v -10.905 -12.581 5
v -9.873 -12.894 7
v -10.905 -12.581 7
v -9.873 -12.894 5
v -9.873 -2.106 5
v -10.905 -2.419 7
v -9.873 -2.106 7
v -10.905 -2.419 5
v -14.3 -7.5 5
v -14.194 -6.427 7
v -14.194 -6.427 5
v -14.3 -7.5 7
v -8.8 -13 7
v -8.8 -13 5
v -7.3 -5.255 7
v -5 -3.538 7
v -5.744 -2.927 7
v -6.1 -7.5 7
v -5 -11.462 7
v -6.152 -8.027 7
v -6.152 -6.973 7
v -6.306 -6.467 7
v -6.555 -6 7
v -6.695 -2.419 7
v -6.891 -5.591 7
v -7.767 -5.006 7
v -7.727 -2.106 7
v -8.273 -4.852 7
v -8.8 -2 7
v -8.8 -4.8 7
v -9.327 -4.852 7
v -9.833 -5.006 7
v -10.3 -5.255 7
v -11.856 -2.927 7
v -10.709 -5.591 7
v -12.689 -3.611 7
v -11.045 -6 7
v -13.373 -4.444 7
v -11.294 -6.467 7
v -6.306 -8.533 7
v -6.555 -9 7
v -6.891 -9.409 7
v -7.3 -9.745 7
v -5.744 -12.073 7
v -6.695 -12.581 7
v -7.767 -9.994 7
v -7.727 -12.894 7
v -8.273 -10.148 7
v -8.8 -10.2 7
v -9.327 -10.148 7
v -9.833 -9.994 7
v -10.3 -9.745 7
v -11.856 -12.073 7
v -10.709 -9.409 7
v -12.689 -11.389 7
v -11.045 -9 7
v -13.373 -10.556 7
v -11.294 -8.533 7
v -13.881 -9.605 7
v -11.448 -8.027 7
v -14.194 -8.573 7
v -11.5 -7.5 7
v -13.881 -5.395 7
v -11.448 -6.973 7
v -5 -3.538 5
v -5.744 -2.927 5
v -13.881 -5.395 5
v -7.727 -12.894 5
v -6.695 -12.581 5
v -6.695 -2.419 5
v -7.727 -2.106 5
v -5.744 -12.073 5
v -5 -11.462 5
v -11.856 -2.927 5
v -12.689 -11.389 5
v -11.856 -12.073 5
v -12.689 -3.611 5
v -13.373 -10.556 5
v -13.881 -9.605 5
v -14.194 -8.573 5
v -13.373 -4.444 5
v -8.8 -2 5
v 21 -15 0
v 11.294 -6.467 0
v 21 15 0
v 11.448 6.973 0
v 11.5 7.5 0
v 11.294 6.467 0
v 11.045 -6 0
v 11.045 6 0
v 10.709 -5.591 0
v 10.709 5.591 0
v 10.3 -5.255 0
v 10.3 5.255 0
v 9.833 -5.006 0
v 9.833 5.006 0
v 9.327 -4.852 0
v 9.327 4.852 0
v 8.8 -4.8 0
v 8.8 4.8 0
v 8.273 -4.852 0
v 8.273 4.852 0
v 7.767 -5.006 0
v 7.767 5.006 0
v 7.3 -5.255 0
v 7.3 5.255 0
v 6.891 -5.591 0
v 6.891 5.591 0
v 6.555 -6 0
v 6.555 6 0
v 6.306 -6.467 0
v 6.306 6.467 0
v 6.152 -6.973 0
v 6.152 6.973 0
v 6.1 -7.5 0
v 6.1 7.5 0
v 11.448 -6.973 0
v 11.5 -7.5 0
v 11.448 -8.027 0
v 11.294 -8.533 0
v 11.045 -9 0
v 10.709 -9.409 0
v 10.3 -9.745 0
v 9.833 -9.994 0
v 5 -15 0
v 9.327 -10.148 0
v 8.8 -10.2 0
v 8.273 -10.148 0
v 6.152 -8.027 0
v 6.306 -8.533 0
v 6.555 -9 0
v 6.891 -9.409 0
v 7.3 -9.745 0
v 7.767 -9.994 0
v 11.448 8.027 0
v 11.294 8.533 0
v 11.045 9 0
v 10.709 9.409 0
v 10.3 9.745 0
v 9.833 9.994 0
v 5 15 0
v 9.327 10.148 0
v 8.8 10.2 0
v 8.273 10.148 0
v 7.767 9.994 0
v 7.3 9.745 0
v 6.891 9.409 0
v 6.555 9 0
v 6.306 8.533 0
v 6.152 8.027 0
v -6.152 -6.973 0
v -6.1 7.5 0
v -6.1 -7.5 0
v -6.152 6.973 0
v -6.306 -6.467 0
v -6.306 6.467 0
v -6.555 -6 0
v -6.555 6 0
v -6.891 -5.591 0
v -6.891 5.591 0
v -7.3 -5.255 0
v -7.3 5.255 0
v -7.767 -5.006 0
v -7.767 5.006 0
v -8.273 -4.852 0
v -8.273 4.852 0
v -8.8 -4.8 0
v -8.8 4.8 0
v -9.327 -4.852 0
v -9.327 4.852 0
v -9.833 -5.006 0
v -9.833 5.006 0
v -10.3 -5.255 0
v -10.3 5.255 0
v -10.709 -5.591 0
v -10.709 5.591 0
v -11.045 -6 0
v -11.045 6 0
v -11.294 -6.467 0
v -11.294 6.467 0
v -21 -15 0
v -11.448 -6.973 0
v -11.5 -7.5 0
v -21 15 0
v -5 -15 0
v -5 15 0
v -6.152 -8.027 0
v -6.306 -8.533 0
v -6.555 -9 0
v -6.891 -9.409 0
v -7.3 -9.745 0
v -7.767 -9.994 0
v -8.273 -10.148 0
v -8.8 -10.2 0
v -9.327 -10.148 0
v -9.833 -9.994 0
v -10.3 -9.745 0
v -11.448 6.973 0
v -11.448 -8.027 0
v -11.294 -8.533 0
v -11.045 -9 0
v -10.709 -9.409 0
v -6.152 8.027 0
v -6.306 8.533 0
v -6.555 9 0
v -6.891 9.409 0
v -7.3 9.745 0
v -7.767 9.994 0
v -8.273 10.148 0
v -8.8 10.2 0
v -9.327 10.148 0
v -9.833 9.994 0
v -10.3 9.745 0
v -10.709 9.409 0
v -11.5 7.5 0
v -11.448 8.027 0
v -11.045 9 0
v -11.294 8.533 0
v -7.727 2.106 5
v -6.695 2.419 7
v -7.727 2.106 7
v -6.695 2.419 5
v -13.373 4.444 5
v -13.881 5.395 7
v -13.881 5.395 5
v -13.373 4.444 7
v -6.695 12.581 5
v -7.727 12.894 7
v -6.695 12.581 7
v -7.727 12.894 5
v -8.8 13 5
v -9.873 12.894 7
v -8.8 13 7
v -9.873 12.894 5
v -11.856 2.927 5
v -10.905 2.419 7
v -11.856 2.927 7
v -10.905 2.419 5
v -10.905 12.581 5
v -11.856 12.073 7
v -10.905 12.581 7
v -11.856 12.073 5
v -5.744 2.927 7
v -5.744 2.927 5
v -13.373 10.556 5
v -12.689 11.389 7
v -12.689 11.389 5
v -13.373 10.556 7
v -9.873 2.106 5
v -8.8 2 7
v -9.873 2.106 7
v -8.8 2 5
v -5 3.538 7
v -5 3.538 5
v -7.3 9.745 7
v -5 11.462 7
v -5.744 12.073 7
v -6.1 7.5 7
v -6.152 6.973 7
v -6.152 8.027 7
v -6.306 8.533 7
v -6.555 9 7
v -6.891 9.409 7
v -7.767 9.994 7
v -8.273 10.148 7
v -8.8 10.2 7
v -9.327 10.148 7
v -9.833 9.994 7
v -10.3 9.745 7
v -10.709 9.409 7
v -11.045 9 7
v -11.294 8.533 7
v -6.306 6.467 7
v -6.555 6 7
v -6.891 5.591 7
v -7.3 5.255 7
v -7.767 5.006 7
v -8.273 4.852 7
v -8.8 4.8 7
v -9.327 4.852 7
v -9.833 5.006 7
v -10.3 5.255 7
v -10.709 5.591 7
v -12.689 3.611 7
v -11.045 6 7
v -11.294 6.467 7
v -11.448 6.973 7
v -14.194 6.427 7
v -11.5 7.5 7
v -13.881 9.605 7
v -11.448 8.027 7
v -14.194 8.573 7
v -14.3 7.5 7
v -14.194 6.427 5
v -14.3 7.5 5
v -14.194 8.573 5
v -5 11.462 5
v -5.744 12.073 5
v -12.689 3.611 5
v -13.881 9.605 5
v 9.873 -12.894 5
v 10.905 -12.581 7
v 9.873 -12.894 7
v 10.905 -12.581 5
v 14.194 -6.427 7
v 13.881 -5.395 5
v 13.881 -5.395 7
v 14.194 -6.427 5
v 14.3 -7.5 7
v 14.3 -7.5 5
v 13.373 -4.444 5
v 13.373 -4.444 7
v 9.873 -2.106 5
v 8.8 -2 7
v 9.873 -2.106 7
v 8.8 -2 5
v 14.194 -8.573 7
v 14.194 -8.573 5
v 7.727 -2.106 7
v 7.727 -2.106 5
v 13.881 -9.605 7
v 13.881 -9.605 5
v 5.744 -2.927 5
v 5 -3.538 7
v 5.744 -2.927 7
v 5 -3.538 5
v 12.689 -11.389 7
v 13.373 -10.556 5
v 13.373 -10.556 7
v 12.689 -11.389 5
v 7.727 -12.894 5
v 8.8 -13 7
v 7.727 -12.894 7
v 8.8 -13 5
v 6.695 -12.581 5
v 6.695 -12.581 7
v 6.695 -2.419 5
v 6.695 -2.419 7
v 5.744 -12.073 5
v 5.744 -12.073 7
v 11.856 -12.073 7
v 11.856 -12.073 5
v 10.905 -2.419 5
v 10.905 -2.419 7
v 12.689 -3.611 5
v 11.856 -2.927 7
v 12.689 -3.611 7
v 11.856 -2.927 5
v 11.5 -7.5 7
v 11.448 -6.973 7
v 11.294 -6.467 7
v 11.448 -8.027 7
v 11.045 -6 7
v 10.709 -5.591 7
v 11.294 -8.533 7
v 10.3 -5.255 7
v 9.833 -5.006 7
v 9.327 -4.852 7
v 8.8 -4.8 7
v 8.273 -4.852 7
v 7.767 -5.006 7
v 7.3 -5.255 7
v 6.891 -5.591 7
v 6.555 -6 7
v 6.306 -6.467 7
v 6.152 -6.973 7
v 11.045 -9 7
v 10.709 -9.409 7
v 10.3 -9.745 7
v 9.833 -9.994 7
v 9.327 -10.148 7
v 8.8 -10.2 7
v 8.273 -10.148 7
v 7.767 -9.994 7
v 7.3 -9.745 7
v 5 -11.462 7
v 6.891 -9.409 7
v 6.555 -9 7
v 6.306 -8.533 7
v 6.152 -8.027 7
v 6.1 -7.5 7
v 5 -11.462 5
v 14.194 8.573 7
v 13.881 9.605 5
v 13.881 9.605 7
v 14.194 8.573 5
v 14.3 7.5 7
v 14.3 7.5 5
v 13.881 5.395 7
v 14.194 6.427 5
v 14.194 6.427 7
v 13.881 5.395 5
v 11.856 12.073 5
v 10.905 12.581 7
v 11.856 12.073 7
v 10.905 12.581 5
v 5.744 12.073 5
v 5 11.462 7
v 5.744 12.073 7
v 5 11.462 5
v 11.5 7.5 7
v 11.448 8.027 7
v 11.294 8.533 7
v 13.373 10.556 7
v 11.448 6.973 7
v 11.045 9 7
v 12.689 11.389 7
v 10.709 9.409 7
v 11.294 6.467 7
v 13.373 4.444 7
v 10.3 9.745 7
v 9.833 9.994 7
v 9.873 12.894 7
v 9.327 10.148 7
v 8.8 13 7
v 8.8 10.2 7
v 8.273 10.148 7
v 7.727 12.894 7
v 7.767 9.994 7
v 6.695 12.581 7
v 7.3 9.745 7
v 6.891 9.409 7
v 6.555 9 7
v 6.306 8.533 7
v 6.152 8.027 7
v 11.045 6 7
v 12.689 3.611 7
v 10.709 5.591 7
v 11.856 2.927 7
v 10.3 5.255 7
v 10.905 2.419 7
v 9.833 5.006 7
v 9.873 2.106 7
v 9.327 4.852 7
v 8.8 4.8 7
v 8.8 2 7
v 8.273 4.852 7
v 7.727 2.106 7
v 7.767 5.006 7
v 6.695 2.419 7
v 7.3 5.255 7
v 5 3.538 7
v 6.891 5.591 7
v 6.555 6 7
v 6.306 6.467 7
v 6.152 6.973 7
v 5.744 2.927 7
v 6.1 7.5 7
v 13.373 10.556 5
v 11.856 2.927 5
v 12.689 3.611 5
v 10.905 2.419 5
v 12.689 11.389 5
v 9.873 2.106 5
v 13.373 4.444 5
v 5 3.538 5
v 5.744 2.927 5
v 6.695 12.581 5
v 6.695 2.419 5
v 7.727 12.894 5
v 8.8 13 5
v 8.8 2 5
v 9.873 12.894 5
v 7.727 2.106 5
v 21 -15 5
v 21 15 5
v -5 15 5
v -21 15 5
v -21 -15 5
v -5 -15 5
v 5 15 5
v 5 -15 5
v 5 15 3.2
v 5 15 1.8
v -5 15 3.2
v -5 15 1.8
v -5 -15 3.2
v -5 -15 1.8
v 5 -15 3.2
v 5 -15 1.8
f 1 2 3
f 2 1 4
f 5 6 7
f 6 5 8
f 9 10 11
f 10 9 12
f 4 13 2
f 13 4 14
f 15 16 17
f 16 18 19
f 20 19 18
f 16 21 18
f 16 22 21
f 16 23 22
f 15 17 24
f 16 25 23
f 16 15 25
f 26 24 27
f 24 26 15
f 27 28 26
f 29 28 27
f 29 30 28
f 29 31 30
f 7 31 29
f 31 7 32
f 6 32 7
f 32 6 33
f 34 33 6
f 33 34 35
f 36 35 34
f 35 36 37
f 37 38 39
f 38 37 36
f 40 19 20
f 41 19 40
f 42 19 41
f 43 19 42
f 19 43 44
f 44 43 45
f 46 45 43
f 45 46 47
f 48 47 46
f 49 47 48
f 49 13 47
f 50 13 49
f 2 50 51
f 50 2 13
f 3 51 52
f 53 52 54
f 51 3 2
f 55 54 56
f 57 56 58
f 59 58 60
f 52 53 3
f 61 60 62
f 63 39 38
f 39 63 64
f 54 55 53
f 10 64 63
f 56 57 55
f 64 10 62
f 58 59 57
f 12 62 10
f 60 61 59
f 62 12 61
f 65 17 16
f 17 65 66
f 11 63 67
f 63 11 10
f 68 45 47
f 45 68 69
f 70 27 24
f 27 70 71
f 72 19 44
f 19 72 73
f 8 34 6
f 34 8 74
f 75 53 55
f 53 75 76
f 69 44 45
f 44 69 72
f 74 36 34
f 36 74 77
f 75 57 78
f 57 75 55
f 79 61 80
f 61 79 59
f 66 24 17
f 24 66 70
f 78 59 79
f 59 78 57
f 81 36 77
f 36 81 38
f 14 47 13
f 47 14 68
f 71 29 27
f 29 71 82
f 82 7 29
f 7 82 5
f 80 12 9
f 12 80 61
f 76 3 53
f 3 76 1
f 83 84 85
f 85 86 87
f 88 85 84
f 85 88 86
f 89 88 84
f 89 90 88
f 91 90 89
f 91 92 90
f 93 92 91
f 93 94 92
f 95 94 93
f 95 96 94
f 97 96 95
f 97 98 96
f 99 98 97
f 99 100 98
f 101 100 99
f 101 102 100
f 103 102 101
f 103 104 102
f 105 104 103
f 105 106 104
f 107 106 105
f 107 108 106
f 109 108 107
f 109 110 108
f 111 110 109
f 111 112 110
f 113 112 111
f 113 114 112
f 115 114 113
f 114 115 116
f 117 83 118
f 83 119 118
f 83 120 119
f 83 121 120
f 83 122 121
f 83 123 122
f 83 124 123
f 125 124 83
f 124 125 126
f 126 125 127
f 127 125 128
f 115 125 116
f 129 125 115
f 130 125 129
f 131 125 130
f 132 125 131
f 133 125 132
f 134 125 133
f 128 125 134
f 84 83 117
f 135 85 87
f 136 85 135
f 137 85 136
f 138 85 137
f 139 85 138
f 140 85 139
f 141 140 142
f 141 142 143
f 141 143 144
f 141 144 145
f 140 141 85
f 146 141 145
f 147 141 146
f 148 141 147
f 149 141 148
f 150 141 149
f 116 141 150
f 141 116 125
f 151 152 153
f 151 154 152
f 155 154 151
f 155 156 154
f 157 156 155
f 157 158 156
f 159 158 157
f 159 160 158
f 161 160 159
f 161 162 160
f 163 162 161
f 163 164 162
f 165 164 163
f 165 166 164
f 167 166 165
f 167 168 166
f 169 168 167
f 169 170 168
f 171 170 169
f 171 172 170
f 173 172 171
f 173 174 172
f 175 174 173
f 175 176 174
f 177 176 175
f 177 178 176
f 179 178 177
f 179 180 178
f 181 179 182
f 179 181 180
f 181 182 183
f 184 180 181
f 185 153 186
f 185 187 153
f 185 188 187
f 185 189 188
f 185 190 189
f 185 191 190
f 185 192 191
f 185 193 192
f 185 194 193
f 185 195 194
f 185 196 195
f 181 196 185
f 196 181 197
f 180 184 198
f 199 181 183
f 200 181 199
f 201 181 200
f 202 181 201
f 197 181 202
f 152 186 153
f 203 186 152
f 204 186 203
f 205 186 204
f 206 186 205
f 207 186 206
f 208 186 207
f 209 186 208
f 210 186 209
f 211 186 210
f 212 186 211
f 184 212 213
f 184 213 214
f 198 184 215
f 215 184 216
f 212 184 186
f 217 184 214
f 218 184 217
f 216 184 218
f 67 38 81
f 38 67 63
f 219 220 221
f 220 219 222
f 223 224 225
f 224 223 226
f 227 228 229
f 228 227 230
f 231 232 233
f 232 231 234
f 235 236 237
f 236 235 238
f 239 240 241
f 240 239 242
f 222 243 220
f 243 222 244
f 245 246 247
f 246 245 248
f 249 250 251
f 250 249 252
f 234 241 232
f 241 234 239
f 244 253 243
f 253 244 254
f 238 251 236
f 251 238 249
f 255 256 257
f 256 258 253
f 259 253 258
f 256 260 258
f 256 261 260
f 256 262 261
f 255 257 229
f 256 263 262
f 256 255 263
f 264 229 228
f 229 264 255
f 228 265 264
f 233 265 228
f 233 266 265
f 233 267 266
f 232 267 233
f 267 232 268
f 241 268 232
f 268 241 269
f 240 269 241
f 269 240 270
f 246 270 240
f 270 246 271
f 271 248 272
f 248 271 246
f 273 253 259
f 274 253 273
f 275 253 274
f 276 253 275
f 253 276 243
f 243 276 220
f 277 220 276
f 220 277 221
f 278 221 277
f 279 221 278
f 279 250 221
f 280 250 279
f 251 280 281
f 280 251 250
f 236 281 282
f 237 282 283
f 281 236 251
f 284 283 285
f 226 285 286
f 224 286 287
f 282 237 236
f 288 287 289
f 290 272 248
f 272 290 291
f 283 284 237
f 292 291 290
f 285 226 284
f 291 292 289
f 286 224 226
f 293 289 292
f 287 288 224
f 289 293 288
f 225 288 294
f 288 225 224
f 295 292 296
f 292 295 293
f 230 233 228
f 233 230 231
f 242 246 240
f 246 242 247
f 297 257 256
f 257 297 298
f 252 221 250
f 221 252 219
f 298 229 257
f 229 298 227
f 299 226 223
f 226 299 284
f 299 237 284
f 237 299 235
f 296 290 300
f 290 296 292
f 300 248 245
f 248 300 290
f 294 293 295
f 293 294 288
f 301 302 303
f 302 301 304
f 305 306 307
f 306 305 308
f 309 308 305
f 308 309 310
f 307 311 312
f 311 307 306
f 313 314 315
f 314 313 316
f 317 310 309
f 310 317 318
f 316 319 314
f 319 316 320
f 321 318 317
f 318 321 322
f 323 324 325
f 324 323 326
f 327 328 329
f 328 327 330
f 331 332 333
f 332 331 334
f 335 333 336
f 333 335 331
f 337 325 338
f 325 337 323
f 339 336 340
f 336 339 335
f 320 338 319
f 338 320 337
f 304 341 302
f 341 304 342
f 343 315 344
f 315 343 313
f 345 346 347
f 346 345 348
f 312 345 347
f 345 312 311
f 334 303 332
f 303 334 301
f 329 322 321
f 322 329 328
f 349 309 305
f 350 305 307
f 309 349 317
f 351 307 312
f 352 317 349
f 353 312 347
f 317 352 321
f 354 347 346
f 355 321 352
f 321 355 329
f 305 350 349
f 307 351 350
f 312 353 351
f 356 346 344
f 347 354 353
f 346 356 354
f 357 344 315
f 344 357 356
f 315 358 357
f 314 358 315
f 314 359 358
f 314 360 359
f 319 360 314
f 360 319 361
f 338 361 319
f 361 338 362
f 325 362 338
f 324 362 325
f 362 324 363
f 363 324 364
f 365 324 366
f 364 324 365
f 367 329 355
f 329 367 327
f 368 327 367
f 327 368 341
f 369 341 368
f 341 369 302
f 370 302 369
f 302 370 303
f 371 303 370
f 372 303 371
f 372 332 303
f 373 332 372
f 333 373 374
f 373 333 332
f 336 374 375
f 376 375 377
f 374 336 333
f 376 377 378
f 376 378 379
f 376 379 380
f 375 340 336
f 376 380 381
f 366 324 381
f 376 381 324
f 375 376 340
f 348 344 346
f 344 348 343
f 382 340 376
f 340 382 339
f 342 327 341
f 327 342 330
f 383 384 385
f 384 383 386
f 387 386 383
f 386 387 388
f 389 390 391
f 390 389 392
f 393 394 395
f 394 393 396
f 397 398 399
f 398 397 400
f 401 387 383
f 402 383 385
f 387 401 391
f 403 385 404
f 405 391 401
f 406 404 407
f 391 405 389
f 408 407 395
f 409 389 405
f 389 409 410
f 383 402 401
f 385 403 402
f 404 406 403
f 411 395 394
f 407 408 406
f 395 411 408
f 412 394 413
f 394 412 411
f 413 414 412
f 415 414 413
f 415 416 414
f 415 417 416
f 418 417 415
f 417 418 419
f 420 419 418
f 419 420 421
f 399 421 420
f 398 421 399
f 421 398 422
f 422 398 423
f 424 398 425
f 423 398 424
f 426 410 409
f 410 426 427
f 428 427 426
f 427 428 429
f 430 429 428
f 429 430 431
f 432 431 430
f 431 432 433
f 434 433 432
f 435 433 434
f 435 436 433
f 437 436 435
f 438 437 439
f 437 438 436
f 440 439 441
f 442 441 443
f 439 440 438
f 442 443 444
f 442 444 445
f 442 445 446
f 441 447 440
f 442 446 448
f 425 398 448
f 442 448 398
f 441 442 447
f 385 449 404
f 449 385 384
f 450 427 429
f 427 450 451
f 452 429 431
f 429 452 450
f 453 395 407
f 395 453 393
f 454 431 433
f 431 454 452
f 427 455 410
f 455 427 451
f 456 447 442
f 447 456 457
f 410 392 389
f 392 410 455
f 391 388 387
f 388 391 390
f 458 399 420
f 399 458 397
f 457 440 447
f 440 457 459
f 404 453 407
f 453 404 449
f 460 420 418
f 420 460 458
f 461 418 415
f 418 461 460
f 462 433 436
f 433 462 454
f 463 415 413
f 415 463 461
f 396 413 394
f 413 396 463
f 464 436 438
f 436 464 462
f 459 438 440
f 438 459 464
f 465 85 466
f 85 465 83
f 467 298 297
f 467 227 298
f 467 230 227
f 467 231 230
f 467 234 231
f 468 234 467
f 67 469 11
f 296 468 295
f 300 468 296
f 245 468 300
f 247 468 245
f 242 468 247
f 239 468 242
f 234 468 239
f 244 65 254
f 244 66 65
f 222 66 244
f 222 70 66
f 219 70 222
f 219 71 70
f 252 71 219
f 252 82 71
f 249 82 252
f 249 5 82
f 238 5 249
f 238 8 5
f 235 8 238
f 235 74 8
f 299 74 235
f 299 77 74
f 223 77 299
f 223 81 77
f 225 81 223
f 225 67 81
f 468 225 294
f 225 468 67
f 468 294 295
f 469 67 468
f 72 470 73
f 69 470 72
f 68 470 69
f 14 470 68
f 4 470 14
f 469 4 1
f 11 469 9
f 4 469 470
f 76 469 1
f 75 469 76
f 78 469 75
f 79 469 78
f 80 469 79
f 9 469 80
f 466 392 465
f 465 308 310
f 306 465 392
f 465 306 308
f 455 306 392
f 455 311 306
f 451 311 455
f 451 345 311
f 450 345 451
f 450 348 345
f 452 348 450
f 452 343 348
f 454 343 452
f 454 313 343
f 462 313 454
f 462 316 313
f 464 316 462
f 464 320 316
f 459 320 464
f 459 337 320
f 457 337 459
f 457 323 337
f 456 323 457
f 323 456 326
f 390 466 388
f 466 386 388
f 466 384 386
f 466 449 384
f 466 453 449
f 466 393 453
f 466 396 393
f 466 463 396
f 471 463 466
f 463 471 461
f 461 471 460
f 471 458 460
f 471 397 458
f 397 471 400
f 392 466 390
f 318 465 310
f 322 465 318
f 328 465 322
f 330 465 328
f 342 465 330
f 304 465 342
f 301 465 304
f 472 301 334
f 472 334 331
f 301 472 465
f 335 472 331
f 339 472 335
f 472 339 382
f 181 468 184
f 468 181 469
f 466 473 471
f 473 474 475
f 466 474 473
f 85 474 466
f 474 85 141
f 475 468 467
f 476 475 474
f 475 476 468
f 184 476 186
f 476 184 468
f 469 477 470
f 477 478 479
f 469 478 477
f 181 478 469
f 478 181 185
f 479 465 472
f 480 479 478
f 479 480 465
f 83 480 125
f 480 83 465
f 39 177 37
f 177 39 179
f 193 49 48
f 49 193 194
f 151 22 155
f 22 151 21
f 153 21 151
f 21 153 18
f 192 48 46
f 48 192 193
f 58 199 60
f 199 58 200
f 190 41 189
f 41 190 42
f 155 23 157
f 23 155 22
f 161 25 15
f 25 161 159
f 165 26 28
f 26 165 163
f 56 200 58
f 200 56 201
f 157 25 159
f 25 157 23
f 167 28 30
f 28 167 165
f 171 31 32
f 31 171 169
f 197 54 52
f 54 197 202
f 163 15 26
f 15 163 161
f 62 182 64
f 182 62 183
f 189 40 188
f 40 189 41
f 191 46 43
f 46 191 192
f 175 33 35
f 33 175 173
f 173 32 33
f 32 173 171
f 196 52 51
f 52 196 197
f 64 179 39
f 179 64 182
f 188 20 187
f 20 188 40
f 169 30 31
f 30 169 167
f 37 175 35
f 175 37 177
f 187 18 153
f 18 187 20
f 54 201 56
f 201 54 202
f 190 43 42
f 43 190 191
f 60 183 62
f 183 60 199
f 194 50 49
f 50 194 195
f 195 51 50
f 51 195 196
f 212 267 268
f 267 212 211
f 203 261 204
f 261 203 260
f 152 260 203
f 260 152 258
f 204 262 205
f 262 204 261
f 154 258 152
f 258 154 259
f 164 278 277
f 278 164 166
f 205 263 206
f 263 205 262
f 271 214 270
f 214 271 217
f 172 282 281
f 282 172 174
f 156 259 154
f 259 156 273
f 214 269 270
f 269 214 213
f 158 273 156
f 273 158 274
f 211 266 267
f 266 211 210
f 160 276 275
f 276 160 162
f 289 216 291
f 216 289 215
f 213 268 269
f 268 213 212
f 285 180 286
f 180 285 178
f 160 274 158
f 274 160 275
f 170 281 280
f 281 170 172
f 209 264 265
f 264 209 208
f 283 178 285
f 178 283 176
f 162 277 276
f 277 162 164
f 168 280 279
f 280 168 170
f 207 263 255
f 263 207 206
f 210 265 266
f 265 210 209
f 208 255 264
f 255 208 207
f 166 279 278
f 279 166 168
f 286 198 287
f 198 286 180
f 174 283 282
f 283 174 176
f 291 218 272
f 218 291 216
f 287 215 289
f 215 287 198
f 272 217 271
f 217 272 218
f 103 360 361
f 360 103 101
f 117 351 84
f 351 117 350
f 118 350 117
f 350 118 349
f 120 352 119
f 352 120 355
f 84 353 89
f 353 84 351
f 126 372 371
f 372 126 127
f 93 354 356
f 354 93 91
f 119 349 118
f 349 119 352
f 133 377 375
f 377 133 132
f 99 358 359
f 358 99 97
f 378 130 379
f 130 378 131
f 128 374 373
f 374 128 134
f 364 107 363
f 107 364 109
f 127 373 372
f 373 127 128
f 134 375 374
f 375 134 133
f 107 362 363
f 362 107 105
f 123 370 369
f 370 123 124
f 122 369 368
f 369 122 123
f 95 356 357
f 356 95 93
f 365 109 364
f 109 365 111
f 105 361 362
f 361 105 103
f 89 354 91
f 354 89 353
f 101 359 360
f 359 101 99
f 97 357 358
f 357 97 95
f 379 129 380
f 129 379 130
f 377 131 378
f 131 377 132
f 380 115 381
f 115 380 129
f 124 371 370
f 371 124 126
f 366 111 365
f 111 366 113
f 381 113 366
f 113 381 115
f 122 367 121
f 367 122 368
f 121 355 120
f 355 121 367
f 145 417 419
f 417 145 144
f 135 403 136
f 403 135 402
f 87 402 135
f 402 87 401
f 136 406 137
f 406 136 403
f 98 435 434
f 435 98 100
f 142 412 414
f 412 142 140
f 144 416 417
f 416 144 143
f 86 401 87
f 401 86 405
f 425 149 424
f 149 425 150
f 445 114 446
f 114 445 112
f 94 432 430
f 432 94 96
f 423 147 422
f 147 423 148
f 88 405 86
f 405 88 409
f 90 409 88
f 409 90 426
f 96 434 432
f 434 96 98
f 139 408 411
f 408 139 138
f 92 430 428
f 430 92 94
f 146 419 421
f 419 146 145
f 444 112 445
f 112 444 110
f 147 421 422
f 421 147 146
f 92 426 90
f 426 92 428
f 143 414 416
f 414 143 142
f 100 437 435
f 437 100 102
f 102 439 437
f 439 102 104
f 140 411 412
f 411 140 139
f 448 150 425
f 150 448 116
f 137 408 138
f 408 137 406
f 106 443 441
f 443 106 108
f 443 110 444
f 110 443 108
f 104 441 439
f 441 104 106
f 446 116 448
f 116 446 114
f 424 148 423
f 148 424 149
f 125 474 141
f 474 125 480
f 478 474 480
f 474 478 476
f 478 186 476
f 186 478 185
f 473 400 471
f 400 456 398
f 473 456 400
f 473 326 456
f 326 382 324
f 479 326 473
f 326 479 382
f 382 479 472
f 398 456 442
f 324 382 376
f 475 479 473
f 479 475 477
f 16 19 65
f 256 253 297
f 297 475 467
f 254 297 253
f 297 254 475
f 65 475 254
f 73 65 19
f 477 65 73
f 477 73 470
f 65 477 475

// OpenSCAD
$fn = 32;

// ----------------------------------------------------------------------
// Living hinge: 42 x 30 mm plates, 1.4 mm flexible web
// ----------------------------------------------------------------------

// --- parameters (mm) ---
plate_len = 16;           // plate length outside the web
plate_w = 30;             // plate width
thick = 5;                // plate thickness
web_half = 5;             // half width of the flex band
web_t = 1.4;              // flexible web thickness
web_z = 1.8;              // web position inside the thickness
boss_d = 11;              // screw boss diameter
boss_h = 7;               // screw boss height
boss_x = 8.8;             // screw boss distance from the web
screw_d = 5.4;            // screw hole

difference() {
  union() {
    /* one flat strip, later thinned at the middle */
    translate([-21, -15, 0]) cube([42, 30, 5]);
    /* screw bosses, sunk 0.5 mm into the plates */
    for (sx = [-8.8, 8.8]) {
      for (sy = [-7.5, 7.5]) {
        translate([sx, sy, 0]) cylinder(h = boss_h, d = boss_d);
      }
    }
  }
  /* channel from below: leaves the web on top of it */
  translate([-5, -17.5, -2.5]) cube([10, 35, 4.3]);
  /* channel from above: thins the web down to web_t */
  translate([-5, -17.5, 3.2]) cube([10, 35, 4.3]);
  /* screw holes through the bosses */
  for (sx = [-8.8, 8.8]) {
    for (sy = [-7.5, 7.5]) {
      translate([sx, sy, -2.5]) cylinder(h = boss_h + 5, d = screw_d);
    }
  }
}
